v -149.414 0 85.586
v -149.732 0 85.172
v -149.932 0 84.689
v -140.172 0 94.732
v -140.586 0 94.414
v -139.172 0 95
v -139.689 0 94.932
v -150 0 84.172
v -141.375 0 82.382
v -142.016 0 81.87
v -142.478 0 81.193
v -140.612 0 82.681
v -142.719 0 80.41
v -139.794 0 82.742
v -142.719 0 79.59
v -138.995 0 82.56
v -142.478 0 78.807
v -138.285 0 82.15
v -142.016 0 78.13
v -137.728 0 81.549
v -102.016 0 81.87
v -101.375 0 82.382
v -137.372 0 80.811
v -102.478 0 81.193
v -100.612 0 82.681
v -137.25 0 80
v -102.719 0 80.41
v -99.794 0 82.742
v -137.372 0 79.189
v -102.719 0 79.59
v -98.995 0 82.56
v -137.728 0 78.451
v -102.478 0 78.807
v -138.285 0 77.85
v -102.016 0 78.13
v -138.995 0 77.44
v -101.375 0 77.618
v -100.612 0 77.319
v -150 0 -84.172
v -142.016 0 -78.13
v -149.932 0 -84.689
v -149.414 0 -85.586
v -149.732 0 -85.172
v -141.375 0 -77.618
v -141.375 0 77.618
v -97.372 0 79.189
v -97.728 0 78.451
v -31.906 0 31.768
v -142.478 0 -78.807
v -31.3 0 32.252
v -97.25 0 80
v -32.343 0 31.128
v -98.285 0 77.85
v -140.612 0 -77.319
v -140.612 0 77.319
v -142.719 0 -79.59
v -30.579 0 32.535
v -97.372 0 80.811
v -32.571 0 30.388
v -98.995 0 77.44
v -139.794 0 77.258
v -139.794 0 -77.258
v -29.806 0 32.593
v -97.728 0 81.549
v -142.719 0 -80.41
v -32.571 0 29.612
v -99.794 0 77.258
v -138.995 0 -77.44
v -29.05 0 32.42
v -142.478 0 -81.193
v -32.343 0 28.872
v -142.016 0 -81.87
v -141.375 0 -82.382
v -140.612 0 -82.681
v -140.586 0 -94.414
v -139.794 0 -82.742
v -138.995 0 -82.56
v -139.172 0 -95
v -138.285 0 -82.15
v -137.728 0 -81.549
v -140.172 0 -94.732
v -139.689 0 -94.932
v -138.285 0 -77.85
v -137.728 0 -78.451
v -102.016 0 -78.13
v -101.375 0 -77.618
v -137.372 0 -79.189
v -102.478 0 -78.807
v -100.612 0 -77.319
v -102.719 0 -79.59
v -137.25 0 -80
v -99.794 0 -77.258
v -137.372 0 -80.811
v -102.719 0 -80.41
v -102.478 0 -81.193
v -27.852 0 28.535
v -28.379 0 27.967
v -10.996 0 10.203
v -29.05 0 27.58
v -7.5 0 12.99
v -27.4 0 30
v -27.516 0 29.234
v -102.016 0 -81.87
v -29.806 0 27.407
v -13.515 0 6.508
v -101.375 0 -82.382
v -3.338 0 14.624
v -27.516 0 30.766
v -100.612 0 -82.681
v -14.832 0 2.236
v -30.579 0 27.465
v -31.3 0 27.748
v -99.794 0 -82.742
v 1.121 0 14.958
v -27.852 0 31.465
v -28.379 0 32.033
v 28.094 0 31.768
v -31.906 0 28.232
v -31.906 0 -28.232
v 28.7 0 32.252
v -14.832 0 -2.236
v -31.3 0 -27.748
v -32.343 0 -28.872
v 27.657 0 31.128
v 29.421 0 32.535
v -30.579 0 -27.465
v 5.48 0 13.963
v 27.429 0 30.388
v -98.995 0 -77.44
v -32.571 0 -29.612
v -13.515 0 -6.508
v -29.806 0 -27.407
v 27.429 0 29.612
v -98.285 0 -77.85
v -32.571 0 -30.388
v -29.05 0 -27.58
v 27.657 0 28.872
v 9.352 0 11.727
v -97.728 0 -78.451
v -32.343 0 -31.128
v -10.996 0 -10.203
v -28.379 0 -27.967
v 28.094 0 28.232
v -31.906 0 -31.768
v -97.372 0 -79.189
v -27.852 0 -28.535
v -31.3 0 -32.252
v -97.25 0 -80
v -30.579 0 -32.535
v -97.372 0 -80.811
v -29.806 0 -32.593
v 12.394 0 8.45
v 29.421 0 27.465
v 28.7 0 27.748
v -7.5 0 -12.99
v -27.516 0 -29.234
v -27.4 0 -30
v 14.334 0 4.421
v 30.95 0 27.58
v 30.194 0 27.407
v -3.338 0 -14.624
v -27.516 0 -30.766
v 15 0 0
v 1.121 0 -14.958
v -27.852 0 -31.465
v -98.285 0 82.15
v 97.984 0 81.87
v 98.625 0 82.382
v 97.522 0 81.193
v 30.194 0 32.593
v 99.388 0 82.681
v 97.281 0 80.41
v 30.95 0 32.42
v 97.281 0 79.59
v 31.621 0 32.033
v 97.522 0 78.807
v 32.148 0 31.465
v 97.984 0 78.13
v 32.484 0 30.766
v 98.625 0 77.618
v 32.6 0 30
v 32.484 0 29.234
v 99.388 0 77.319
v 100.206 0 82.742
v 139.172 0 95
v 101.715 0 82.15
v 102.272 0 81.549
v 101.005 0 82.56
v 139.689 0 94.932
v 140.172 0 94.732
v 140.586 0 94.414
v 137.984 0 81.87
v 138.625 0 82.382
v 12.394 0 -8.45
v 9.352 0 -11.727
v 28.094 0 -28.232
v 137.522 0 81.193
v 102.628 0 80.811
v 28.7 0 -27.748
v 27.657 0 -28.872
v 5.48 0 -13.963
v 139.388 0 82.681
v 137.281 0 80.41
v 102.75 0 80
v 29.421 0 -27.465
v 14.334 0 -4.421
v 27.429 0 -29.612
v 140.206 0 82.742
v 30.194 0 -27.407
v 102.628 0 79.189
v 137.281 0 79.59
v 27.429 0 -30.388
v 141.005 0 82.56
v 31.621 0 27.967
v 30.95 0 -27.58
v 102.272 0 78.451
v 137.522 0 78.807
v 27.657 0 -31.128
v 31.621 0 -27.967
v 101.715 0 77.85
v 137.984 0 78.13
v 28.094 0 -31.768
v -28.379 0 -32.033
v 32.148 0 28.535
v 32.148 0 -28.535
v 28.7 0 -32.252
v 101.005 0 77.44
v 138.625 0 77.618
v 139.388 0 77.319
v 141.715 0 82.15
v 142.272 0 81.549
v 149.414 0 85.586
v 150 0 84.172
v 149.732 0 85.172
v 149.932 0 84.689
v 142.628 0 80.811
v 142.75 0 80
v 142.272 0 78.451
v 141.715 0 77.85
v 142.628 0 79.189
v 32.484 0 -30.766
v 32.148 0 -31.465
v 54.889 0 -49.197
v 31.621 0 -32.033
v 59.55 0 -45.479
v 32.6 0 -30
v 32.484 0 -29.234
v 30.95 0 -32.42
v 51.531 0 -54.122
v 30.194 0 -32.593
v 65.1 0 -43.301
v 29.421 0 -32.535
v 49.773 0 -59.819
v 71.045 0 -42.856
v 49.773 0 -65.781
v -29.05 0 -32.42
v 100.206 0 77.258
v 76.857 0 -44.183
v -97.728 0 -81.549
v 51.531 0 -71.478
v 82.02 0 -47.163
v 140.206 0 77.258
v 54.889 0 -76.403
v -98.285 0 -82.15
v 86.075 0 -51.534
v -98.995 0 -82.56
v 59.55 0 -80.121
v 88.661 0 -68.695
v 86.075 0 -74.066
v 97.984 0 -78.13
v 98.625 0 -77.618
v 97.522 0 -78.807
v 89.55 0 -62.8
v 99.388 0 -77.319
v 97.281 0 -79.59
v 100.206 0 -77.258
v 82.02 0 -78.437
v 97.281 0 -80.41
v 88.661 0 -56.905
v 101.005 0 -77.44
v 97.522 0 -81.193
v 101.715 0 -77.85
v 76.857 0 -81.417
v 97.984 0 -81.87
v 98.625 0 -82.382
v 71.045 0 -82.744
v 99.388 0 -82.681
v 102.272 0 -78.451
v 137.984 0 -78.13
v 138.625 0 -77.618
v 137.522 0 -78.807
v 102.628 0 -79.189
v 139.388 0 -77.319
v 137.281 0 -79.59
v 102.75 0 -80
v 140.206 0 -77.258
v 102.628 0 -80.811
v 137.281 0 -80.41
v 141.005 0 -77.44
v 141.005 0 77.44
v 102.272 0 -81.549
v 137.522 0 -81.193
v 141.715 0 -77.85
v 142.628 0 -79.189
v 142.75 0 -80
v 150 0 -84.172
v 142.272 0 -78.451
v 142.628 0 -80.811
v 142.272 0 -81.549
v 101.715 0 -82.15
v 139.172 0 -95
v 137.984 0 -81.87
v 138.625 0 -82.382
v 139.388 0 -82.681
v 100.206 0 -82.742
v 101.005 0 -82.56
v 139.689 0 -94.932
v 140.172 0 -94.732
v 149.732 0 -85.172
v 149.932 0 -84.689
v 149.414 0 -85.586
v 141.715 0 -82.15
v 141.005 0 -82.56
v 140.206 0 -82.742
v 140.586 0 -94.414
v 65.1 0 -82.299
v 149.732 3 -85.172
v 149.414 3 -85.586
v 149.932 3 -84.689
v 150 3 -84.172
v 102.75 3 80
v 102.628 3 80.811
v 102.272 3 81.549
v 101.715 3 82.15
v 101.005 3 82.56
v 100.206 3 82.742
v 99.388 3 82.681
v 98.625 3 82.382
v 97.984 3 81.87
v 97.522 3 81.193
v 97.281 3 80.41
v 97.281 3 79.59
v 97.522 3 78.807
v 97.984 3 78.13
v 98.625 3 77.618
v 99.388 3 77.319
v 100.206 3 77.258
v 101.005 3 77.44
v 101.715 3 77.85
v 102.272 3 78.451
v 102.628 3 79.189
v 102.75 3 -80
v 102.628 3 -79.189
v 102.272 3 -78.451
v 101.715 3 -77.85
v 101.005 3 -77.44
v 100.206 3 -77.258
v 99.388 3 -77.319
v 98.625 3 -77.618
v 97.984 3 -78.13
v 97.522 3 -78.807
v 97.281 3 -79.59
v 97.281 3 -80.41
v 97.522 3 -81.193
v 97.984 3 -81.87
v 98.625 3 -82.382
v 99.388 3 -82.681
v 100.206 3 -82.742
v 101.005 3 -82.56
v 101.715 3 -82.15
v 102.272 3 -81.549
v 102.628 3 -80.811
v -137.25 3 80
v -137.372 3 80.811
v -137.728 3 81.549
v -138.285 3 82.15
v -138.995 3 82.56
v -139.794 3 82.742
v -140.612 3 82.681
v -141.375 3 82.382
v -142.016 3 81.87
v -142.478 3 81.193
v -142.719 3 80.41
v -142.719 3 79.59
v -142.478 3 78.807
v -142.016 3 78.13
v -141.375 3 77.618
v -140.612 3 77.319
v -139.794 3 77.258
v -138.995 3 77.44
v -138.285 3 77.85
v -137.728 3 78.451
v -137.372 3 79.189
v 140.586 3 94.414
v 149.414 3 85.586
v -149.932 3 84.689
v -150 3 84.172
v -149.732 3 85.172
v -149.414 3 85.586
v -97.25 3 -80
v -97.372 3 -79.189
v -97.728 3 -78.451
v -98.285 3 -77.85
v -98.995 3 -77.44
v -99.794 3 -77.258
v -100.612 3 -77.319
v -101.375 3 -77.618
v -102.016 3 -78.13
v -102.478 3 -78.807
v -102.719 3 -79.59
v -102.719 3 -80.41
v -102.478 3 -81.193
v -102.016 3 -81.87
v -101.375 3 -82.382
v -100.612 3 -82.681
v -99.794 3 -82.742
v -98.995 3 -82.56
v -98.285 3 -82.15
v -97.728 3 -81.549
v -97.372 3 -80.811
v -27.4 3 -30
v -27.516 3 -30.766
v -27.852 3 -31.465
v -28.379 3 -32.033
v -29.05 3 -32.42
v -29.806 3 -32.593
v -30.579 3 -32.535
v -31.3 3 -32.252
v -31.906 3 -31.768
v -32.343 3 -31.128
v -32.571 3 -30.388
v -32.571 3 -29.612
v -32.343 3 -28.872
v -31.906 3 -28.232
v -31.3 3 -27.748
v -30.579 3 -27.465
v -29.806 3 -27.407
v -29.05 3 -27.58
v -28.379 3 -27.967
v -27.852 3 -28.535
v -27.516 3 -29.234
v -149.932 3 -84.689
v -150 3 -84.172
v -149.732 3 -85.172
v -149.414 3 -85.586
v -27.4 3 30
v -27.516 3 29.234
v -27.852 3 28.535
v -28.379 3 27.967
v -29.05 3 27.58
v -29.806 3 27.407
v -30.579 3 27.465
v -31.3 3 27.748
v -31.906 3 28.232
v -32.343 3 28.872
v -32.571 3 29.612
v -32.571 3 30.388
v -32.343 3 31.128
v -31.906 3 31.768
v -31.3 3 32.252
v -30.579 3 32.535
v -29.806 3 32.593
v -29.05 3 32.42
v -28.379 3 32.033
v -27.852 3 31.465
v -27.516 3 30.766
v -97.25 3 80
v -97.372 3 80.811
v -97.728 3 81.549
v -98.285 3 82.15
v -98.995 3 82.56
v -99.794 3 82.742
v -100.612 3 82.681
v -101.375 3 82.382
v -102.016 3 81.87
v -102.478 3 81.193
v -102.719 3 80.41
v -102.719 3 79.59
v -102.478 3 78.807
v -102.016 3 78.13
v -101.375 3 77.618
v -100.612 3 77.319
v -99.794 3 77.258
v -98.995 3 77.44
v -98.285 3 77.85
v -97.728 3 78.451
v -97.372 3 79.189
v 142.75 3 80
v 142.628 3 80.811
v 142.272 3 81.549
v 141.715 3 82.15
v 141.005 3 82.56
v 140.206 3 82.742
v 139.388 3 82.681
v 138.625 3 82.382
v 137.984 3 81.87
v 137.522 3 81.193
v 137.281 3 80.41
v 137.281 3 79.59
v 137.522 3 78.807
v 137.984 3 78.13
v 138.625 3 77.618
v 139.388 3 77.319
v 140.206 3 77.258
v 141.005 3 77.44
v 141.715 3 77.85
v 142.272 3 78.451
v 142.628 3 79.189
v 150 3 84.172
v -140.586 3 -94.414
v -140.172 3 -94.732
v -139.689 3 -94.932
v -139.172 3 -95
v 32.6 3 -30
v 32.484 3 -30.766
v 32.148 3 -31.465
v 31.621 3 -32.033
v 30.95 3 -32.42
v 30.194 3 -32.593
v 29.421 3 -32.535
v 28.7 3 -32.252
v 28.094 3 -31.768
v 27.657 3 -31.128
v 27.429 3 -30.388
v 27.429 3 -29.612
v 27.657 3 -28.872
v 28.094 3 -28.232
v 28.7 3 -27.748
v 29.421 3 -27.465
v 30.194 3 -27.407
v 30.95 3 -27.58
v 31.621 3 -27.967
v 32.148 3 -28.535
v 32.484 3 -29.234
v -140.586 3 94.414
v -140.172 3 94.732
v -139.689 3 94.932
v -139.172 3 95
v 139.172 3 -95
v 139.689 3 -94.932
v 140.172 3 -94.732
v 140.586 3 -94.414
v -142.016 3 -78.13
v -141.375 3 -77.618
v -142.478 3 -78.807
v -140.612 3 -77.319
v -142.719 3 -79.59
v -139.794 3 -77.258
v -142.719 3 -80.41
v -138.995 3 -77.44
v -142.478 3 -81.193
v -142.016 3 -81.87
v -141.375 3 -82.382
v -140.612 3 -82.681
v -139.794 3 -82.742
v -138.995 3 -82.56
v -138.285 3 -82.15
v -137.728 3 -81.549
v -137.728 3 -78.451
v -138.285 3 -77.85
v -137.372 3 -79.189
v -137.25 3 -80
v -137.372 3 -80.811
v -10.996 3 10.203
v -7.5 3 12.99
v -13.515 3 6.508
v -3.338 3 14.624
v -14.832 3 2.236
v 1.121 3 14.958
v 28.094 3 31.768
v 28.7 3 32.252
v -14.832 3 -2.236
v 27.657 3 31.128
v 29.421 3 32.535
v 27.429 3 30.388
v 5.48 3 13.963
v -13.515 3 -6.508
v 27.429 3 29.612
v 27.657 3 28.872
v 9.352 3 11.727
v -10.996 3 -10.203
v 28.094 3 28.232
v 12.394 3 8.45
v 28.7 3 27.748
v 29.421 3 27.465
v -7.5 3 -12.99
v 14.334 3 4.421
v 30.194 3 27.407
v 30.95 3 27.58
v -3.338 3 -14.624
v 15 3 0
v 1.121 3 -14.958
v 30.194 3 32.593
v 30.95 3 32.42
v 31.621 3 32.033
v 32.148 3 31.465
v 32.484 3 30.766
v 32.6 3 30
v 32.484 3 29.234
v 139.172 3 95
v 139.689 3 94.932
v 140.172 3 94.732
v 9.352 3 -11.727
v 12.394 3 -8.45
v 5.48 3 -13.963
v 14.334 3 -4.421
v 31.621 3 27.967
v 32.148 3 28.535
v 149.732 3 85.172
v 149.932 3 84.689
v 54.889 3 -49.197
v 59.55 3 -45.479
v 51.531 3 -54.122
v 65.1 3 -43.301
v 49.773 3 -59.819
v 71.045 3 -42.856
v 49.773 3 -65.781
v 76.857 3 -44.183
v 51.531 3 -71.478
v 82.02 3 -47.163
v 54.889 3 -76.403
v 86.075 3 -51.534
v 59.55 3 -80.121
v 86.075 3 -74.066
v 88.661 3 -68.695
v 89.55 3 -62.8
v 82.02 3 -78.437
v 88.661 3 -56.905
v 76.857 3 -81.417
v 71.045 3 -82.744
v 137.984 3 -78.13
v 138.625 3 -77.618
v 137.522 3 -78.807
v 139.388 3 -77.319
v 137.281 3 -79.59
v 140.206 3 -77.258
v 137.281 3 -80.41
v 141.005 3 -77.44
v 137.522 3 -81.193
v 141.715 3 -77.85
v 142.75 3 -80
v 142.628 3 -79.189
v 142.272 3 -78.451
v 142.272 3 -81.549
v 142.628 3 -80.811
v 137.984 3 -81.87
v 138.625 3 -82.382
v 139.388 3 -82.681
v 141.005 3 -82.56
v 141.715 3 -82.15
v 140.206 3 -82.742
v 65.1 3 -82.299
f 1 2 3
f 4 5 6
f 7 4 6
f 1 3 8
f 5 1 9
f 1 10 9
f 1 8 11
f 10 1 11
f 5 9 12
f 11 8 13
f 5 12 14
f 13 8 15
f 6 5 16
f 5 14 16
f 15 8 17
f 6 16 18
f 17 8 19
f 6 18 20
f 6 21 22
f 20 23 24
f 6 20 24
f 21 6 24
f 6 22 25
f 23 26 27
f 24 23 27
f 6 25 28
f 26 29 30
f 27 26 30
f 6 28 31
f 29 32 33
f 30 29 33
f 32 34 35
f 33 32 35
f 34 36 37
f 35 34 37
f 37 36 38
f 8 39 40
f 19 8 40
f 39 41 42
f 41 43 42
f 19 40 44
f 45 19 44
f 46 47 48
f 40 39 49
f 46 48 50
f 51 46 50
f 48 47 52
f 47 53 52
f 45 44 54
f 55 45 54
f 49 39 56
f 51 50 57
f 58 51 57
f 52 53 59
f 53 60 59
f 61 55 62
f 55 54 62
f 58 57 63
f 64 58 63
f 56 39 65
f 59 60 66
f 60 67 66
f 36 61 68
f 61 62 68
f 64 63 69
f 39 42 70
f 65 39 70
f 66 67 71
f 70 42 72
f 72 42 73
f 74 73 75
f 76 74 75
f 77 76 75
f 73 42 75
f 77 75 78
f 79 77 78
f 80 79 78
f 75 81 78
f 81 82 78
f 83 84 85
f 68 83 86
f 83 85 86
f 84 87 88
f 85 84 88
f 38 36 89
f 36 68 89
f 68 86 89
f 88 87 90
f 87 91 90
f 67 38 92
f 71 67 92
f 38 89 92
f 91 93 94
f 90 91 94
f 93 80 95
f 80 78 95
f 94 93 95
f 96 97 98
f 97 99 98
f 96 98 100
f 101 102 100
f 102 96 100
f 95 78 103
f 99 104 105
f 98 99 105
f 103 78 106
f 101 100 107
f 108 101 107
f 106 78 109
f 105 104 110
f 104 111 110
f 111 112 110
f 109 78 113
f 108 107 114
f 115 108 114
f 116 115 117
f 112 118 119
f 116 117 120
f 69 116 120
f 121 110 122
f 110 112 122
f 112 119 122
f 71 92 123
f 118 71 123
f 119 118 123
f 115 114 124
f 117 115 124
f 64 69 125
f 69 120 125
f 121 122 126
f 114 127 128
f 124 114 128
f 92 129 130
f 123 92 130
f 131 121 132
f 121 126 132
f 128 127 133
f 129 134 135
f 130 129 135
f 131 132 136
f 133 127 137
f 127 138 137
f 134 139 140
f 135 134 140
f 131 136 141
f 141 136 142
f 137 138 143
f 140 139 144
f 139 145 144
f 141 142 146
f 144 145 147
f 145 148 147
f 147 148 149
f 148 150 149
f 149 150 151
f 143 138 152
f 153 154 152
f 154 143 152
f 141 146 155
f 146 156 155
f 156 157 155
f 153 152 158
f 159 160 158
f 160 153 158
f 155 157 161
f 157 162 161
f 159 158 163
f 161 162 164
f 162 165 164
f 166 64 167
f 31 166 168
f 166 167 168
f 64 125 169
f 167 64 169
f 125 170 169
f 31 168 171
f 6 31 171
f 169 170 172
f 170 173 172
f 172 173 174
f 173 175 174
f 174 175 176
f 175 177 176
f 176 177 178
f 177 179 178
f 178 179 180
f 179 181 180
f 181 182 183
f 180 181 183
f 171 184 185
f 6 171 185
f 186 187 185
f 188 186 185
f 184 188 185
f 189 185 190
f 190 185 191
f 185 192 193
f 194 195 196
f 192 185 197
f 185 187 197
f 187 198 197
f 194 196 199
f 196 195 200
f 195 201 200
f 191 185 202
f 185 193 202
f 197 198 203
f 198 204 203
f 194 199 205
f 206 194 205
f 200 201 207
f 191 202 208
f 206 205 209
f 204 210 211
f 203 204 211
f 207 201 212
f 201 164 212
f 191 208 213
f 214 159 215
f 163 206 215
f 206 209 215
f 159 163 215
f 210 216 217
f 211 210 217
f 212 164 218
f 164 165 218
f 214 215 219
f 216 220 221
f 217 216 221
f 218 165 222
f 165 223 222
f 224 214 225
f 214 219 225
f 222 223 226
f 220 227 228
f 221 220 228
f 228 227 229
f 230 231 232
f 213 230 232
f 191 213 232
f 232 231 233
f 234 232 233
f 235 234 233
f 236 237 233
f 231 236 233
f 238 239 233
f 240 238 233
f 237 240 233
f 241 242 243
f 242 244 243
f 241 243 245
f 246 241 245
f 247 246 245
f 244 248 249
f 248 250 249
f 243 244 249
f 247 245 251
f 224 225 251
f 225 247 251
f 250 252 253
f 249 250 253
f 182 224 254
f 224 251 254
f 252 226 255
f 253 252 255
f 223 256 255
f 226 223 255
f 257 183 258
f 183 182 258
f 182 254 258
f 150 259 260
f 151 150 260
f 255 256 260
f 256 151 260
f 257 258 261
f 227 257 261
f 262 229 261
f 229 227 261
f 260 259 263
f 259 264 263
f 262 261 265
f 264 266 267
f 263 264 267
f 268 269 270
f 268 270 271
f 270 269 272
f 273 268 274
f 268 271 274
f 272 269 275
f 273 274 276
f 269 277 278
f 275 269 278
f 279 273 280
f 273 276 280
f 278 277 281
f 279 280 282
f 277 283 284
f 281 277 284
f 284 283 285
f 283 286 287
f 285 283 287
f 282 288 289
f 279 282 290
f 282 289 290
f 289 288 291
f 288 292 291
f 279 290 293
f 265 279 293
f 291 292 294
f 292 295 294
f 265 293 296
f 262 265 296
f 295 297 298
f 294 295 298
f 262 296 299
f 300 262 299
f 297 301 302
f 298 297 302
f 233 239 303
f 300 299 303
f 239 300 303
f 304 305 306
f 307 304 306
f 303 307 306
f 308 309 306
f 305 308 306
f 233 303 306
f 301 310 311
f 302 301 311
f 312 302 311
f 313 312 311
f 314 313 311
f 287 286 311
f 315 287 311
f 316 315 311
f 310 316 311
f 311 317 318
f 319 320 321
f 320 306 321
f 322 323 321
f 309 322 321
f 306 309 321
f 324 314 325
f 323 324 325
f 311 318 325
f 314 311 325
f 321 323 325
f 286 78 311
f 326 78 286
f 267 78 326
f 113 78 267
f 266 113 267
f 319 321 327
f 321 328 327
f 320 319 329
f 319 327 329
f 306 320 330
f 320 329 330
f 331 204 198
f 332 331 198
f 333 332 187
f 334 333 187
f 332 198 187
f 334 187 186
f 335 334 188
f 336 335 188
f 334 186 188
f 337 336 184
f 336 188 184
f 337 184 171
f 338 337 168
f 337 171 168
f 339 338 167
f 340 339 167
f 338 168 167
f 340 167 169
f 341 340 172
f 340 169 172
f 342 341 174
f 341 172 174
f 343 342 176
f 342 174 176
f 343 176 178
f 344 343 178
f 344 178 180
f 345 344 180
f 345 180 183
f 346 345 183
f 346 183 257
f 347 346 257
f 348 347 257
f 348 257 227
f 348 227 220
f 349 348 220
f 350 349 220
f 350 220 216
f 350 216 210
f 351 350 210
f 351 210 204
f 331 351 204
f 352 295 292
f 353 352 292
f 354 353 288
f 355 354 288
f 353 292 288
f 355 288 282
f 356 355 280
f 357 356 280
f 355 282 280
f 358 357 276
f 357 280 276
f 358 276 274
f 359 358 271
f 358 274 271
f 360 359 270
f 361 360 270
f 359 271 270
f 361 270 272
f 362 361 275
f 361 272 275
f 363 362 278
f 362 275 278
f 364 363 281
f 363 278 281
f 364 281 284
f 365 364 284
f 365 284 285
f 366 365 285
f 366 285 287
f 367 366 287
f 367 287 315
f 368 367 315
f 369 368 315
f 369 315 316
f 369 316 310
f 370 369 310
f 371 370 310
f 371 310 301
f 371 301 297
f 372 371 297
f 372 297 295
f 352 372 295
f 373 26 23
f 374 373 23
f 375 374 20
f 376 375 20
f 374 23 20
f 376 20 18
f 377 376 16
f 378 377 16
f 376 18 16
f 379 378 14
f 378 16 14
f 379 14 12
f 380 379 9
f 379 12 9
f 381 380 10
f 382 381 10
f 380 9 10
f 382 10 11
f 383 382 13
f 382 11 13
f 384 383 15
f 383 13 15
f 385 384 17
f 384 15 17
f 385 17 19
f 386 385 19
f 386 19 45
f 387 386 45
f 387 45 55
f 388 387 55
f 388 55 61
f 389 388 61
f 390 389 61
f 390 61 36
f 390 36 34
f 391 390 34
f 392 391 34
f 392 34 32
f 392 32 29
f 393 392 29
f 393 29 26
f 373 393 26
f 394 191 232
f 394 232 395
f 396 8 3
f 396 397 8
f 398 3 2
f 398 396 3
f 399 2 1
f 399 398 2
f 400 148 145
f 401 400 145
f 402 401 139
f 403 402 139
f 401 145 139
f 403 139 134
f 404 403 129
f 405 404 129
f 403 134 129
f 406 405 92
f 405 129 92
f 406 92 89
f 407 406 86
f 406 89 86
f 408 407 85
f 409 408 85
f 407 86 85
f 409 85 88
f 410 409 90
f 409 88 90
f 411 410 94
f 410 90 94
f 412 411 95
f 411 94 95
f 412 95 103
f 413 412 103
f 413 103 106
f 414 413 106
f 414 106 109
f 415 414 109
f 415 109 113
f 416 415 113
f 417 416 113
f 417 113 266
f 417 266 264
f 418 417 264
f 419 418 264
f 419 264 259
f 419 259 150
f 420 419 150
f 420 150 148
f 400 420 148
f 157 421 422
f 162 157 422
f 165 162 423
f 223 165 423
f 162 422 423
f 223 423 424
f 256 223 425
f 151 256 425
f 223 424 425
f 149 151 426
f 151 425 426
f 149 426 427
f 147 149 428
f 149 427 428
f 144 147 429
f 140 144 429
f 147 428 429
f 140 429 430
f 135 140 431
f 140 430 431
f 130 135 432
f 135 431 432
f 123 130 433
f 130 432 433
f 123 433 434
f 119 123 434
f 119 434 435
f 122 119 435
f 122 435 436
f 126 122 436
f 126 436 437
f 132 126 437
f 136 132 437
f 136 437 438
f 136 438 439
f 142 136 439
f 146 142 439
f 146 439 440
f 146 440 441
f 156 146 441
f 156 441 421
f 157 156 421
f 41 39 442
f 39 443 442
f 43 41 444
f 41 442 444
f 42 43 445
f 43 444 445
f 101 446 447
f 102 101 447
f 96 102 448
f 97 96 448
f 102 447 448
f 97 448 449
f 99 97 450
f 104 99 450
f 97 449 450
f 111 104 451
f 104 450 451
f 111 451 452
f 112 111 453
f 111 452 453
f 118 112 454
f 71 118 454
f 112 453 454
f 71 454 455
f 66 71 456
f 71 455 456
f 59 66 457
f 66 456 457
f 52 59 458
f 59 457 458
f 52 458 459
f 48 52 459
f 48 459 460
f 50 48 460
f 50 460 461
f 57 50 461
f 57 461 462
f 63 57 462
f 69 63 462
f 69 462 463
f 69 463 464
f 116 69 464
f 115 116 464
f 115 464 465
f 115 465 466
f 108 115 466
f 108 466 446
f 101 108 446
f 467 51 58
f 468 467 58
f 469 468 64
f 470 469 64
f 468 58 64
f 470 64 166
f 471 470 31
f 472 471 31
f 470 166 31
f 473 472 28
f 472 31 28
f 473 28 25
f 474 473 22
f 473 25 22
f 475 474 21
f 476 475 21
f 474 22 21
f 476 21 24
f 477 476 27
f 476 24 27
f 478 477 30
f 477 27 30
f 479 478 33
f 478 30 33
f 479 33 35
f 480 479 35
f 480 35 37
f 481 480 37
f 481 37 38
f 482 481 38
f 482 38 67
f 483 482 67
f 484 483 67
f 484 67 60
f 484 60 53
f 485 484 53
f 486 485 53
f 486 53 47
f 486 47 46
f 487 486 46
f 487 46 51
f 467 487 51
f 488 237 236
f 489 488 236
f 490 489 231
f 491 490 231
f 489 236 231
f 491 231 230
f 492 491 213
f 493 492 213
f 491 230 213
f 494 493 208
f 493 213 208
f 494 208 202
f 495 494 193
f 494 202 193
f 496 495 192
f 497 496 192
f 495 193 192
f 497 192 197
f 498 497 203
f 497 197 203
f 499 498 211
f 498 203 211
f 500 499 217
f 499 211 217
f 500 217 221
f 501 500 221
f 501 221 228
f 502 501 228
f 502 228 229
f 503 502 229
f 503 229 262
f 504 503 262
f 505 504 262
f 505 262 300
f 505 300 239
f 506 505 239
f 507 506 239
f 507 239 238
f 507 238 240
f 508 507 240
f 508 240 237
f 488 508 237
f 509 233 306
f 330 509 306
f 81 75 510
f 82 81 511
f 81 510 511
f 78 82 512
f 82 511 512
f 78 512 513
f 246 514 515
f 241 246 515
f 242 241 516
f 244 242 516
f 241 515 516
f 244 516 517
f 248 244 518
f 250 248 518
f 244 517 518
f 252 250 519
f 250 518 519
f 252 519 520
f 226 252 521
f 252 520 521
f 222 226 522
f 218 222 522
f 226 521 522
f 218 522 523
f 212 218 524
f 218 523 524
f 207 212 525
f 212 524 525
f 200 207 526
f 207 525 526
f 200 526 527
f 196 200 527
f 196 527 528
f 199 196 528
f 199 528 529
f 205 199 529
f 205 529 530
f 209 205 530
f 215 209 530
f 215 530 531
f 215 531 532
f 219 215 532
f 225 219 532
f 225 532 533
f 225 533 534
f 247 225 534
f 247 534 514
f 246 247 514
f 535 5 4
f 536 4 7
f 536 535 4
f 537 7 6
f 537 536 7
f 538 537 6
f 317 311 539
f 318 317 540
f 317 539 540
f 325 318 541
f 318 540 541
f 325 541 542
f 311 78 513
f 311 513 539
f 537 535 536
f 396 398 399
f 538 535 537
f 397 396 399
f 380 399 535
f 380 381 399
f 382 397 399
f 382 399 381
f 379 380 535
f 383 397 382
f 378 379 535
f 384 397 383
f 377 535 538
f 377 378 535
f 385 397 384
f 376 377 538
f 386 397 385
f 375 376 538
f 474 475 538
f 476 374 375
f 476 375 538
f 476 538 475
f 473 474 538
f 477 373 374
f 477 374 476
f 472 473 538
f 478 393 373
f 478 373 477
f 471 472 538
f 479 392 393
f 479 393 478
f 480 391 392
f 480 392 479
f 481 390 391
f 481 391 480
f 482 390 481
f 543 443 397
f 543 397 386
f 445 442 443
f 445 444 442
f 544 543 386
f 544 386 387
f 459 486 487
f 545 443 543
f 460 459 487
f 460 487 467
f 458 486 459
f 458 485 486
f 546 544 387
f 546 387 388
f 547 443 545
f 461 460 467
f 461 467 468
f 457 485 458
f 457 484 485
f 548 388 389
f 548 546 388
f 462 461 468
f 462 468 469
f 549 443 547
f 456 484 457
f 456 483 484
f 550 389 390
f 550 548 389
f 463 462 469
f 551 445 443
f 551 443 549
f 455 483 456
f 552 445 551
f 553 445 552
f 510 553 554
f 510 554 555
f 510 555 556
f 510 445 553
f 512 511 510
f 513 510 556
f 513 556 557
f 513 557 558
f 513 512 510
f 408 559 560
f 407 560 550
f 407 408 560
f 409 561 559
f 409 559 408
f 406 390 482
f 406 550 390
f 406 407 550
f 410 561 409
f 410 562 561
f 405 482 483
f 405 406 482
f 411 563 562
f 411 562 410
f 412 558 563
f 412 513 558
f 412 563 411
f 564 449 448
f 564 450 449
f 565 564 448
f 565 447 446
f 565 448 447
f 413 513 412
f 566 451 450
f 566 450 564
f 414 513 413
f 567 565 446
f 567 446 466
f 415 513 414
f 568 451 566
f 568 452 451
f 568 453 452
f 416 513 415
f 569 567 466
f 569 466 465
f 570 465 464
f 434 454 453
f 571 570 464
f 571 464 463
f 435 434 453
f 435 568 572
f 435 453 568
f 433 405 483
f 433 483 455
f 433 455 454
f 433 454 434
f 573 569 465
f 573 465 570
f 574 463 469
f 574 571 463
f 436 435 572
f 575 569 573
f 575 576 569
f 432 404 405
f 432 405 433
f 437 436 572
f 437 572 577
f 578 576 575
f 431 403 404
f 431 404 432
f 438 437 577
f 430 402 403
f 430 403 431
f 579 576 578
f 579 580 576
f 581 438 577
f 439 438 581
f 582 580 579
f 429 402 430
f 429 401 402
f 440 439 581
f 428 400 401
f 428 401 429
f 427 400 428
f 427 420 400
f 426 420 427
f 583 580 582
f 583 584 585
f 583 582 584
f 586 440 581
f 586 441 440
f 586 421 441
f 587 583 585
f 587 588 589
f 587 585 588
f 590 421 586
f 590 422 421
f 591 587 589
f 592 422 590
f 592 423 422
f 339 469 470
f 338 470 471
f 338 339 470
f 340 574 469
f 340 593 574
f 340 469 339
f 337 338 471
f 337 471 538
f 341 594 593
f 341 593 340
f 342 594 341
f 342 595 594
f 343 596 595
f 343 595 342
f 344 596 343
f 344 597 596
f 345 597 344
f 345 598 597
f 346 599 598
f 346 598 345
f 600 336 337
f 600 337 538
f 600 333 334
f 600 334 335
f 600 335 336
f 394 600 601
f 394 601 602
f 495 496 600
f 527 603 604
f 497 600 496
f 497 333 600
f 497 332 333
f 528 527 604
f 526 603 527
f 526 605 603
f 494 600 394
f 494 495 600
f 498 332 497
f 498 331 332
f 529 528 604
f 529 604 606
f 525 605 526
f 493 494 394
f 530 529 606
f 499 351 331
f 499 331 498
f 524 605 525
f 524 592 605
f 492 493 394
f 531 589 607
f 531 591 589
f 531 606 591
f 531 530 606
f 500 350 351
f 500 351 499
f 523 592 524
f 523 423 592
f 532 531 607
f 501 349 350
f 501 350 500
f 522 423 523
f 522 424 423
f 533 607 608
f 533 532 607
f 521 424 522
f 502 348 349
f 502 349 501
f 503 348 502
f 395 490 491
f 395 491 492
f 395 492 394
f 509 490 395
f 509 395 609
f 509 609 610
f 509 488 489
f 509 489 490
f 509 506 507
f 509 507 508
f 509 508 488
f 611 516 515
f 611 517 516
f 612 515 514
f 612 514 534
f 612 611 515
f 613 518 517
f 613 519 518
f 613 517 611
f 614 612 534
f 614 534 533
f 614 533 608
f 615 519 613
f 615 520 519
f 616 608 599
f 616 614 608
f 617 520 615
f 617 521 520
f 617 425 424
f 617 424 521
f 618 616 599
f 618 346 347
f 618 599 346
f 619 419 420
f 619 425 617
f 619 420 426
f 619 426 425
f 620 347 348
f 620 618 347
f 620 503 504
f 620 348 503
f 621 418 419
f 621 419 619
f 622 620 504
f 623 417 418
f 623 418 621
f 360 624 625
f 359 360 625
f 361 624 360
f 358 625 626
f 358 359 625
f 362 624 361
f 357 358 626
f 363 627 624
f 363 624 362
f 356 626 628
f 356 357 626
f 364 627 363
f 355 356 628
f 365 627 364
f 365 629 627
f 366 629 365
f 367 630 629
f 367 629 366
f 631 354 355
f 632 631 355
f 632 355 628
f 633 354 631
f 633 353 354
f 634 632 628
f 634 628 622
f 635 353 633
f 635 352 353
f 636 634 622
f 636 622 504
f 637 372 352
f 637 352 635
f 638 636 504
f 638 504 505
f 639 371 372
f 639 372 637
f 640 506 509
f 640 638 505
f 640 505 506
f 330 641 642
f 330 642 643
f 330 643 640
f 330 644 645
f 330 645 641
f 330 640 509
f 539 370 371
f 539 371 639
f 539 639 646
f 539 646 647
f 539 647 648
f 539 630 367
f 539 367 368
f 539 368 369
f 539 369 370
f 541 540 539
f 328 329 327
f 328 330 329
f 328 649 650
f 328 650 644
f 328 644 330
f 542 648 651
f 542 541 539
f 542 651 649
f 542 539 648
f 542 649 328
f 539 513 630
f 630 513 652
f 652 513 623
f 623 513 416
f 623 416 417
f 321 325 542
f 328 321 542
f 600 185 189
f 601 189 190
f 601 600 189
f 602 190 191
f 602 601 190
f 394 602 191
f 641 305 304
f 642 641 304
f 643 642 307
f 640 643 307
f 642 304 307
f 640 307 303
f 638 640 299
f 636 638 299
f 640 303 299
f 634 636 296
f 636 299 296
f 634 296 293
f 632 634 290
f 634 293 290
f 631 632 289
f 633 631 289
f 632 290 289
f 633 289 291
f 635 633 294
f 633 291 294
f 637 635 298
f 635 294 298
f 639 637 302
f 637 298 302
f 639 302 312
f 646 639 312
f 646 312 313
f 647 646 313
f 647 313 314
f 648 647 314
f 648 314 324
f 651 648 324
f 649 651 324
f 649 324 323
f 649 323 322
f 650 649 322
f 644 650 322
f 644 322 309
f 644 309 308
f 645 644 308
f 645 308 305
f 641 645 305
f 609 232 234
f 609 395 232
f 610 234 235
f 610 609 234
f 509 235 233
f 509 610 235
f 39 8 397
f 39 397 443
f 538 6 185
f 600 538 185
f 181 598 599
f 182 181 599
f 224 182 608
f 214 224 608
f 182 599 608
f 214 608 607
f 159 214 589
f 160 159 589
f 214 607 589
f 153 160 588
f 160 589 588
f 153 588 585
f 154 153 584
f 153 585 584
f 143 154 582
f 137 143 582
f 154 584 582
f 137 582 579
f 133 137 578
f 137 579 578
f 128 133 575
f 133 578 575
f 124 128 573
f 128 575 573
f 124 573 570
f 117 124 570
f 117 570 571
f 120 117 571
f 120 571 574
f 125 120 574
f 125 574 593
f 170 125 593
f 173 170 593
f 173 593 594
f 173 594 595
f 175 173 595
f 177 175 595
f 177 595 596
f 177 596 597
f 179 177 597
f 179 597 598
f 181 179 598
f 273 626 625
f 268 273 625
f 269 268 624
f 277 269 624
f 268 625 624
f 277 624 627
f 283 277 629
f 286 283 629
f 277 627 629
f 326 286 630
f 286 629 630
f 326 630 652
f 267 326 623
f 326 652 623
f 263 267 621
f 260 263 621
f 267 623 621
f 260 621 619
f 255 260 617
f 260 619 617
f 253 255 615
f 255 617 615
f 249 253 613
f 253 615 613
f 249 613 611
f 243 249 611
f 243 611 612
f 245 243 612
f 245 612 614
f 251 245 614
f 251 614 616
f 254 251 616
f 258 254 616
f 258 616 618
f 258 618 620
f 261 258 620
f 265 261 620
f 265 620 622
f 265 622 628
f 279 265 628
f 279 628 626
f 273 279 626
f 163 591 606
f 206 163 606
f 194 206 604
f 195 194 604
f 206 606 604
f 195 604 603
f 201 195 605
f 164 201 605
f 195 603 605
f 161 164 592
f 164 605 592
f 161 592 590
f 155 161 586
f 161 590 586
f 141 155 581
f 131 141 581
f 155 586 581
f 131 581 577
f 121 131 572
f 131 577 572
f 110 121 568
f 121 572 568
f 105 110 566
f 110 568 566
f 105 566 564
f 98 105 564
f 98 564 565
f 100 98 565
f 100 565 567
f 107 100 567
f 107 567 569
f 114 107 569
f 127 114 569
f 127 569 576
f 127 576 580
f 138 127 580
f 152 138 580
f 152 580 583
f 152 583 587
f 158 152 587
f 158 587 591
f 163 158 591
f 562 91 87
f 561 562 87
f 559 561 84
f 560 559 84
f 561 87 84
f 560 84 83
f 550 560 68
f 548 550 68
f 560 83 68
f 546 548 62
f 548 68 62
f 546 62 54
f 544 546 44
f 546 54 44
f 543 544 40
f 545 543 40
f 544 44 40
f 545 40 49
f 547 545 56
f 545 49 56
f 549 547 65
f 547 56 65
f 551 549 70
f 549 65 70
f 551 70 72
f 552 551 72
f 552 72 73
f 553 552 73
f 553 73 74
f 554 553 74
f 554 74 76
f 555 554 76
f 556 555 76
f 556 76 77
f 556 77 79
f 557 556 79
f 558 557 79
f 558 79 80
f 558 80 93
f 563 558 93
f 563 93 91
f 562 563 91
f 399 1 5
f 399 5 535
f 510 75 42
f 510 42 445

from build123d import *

# Parameters (mm, degrees)
ESQUISSE1_W                     = 300
ESQUISSE1_H                     = 190
BOSS_EXTRU_1_DEPTH              = 3
CHANFREIN1_SIZE                 = 10
CONG_1_R                        = 2
ESQUISSE2_R                     = 2.75
ENL_V_MAT_EXTRU_1_DEPTH         = 4
R_P_TITION_LIN_AIRE1_COUNT      = 2
R_P_TITION_LIN_AIRE1_PITCH      = 240
R_P_TITION_LIN_AIRE1_COUNT_DIR2 = 2
R_P_TITION_LIN_AIRE1_PITCH_DIR2 = 160
ESQUISSE4_R                     = 2.75
ESQUISSE4_R_2                   = 20
ESQUISSE4_R_3                   = 15
ENL_V_MAT_EXTRU_3_DEPTH         = 10
ESQUISSE5_R                     = 2.6
ENL_V_MAT_EXTRU_4_DEPTH         = 4


with BuildPart() as part:
    # Esquisse1 → Boss.-Extru.1 (new body)
    with BuildSketch(Plane(origin=(0, 0, 0), x_dir=(1, 0, 0), z_dir=(0, 1, 0))):
        Rectangle(ESQUISSE1_W, ESQUISSE1_H)
    extrude(amount=BOSS_EXTRU_1_DEPTH)

    # Chanfrein1
    chanfrein1_edges = [part.edges().sort_by_distance(p)[0] for p in [
        (150, 1.5, 95),
        (-150, 1.5, 95),
        (-150, 1.5, -95),
        (150, 1.5, -95),
    ]]
    chamfer(chanfrein1_edges, length=CHANFREIN1_SIZE)

    # Congé1
    cong_1_edges = [part.edges().sort_by_distance(p)[0] for p in [
        (140, 1.5, 95),
        (-140, 1.5, 95),
        (-150, 1.5, -85),
        (-150, 1.5, 85),
        (150, 1.5, -85),
        (150, 1.5, 85),
        (-140, 1.5, -95),
        (140, 1.5, -95),
    ]]
    fillet(cong_1_edges, radius=CONG_1_R)

    # Esquisse2 → Enlèv. mat.-Extru.1 (cut, through all)
    with BuildSketch(Plane.XZ):
        with Locations((-140, 80)):
            Circle(ESQUISSE2_R)
        with Locations((-100, 80)):
            Circle(ESQUISSE2_R)
    enl_v_mat_extru_1 = extrude(amount=-ENL_V_MAT_EXTRU_1_DEPTH, mode=Mode.SUBTRACT)

    # Répétition linéaire1: Enl_v. mat.-Extru.1 2 × 2
    with Locations(*[(i * R_P_TITION_LIN_AIRE1_PITCH, 0, -j * R_P_TITION_LIN_AIRE1_PITCH_DIR2) for i in range(R_P_TITION_LIN_AIRE1_COUNT) for j in range(R_P_TITION_LIN_AIRE1_COUNT_DIR2) if (i, j) != (0, 0)]):
        add(enl_v_mat_extru_1, mode=Mode.SUBTRACT)

    # Esquisse4 → Enlèv. mat.-Extru.3 (cut)
    with BuildSketch(Plane(origin=(0, 3, 0), x_dir=(1, 0, 0), z_dir=(0, 1, 0))):
        with Locations((100, 80)):
            Circle(ESQUISSE4_R)
        with Locations((69.55, 62.8)):
            Circle(ESQUISSE4_R_2)
        Circle(ESQUISSE4_R_3)
    extrude(amount=-ENL_V_MAT_EXTRU_3_DEPTH, mode=Mode.SUBTRACT)

    # Esquisse5 → Enlèv. mat.-Extru.4 (cut, through all)
    with BuildSketch(Plane(origin=(0, 3, 0), x_dir=(1, 0, 0), z_dir=(0, 1, 0))):
        with Locations((-30, 30)):
            Circle(ESQUISSE5_R)
        with Locations((30, 30)):
            Circle(ESQUISSE5_R)
        with Locations((30, -30)):
            Circle(ESQUISSE5_R)
        with Locations((-30, -30)):
            Circle(ESQUISSE5_R)
    extrude(amount=-ENL_V_MAT_EXTRU_4_DEPTH, mode=Mode.SUBTRACT)


solid = part.part
